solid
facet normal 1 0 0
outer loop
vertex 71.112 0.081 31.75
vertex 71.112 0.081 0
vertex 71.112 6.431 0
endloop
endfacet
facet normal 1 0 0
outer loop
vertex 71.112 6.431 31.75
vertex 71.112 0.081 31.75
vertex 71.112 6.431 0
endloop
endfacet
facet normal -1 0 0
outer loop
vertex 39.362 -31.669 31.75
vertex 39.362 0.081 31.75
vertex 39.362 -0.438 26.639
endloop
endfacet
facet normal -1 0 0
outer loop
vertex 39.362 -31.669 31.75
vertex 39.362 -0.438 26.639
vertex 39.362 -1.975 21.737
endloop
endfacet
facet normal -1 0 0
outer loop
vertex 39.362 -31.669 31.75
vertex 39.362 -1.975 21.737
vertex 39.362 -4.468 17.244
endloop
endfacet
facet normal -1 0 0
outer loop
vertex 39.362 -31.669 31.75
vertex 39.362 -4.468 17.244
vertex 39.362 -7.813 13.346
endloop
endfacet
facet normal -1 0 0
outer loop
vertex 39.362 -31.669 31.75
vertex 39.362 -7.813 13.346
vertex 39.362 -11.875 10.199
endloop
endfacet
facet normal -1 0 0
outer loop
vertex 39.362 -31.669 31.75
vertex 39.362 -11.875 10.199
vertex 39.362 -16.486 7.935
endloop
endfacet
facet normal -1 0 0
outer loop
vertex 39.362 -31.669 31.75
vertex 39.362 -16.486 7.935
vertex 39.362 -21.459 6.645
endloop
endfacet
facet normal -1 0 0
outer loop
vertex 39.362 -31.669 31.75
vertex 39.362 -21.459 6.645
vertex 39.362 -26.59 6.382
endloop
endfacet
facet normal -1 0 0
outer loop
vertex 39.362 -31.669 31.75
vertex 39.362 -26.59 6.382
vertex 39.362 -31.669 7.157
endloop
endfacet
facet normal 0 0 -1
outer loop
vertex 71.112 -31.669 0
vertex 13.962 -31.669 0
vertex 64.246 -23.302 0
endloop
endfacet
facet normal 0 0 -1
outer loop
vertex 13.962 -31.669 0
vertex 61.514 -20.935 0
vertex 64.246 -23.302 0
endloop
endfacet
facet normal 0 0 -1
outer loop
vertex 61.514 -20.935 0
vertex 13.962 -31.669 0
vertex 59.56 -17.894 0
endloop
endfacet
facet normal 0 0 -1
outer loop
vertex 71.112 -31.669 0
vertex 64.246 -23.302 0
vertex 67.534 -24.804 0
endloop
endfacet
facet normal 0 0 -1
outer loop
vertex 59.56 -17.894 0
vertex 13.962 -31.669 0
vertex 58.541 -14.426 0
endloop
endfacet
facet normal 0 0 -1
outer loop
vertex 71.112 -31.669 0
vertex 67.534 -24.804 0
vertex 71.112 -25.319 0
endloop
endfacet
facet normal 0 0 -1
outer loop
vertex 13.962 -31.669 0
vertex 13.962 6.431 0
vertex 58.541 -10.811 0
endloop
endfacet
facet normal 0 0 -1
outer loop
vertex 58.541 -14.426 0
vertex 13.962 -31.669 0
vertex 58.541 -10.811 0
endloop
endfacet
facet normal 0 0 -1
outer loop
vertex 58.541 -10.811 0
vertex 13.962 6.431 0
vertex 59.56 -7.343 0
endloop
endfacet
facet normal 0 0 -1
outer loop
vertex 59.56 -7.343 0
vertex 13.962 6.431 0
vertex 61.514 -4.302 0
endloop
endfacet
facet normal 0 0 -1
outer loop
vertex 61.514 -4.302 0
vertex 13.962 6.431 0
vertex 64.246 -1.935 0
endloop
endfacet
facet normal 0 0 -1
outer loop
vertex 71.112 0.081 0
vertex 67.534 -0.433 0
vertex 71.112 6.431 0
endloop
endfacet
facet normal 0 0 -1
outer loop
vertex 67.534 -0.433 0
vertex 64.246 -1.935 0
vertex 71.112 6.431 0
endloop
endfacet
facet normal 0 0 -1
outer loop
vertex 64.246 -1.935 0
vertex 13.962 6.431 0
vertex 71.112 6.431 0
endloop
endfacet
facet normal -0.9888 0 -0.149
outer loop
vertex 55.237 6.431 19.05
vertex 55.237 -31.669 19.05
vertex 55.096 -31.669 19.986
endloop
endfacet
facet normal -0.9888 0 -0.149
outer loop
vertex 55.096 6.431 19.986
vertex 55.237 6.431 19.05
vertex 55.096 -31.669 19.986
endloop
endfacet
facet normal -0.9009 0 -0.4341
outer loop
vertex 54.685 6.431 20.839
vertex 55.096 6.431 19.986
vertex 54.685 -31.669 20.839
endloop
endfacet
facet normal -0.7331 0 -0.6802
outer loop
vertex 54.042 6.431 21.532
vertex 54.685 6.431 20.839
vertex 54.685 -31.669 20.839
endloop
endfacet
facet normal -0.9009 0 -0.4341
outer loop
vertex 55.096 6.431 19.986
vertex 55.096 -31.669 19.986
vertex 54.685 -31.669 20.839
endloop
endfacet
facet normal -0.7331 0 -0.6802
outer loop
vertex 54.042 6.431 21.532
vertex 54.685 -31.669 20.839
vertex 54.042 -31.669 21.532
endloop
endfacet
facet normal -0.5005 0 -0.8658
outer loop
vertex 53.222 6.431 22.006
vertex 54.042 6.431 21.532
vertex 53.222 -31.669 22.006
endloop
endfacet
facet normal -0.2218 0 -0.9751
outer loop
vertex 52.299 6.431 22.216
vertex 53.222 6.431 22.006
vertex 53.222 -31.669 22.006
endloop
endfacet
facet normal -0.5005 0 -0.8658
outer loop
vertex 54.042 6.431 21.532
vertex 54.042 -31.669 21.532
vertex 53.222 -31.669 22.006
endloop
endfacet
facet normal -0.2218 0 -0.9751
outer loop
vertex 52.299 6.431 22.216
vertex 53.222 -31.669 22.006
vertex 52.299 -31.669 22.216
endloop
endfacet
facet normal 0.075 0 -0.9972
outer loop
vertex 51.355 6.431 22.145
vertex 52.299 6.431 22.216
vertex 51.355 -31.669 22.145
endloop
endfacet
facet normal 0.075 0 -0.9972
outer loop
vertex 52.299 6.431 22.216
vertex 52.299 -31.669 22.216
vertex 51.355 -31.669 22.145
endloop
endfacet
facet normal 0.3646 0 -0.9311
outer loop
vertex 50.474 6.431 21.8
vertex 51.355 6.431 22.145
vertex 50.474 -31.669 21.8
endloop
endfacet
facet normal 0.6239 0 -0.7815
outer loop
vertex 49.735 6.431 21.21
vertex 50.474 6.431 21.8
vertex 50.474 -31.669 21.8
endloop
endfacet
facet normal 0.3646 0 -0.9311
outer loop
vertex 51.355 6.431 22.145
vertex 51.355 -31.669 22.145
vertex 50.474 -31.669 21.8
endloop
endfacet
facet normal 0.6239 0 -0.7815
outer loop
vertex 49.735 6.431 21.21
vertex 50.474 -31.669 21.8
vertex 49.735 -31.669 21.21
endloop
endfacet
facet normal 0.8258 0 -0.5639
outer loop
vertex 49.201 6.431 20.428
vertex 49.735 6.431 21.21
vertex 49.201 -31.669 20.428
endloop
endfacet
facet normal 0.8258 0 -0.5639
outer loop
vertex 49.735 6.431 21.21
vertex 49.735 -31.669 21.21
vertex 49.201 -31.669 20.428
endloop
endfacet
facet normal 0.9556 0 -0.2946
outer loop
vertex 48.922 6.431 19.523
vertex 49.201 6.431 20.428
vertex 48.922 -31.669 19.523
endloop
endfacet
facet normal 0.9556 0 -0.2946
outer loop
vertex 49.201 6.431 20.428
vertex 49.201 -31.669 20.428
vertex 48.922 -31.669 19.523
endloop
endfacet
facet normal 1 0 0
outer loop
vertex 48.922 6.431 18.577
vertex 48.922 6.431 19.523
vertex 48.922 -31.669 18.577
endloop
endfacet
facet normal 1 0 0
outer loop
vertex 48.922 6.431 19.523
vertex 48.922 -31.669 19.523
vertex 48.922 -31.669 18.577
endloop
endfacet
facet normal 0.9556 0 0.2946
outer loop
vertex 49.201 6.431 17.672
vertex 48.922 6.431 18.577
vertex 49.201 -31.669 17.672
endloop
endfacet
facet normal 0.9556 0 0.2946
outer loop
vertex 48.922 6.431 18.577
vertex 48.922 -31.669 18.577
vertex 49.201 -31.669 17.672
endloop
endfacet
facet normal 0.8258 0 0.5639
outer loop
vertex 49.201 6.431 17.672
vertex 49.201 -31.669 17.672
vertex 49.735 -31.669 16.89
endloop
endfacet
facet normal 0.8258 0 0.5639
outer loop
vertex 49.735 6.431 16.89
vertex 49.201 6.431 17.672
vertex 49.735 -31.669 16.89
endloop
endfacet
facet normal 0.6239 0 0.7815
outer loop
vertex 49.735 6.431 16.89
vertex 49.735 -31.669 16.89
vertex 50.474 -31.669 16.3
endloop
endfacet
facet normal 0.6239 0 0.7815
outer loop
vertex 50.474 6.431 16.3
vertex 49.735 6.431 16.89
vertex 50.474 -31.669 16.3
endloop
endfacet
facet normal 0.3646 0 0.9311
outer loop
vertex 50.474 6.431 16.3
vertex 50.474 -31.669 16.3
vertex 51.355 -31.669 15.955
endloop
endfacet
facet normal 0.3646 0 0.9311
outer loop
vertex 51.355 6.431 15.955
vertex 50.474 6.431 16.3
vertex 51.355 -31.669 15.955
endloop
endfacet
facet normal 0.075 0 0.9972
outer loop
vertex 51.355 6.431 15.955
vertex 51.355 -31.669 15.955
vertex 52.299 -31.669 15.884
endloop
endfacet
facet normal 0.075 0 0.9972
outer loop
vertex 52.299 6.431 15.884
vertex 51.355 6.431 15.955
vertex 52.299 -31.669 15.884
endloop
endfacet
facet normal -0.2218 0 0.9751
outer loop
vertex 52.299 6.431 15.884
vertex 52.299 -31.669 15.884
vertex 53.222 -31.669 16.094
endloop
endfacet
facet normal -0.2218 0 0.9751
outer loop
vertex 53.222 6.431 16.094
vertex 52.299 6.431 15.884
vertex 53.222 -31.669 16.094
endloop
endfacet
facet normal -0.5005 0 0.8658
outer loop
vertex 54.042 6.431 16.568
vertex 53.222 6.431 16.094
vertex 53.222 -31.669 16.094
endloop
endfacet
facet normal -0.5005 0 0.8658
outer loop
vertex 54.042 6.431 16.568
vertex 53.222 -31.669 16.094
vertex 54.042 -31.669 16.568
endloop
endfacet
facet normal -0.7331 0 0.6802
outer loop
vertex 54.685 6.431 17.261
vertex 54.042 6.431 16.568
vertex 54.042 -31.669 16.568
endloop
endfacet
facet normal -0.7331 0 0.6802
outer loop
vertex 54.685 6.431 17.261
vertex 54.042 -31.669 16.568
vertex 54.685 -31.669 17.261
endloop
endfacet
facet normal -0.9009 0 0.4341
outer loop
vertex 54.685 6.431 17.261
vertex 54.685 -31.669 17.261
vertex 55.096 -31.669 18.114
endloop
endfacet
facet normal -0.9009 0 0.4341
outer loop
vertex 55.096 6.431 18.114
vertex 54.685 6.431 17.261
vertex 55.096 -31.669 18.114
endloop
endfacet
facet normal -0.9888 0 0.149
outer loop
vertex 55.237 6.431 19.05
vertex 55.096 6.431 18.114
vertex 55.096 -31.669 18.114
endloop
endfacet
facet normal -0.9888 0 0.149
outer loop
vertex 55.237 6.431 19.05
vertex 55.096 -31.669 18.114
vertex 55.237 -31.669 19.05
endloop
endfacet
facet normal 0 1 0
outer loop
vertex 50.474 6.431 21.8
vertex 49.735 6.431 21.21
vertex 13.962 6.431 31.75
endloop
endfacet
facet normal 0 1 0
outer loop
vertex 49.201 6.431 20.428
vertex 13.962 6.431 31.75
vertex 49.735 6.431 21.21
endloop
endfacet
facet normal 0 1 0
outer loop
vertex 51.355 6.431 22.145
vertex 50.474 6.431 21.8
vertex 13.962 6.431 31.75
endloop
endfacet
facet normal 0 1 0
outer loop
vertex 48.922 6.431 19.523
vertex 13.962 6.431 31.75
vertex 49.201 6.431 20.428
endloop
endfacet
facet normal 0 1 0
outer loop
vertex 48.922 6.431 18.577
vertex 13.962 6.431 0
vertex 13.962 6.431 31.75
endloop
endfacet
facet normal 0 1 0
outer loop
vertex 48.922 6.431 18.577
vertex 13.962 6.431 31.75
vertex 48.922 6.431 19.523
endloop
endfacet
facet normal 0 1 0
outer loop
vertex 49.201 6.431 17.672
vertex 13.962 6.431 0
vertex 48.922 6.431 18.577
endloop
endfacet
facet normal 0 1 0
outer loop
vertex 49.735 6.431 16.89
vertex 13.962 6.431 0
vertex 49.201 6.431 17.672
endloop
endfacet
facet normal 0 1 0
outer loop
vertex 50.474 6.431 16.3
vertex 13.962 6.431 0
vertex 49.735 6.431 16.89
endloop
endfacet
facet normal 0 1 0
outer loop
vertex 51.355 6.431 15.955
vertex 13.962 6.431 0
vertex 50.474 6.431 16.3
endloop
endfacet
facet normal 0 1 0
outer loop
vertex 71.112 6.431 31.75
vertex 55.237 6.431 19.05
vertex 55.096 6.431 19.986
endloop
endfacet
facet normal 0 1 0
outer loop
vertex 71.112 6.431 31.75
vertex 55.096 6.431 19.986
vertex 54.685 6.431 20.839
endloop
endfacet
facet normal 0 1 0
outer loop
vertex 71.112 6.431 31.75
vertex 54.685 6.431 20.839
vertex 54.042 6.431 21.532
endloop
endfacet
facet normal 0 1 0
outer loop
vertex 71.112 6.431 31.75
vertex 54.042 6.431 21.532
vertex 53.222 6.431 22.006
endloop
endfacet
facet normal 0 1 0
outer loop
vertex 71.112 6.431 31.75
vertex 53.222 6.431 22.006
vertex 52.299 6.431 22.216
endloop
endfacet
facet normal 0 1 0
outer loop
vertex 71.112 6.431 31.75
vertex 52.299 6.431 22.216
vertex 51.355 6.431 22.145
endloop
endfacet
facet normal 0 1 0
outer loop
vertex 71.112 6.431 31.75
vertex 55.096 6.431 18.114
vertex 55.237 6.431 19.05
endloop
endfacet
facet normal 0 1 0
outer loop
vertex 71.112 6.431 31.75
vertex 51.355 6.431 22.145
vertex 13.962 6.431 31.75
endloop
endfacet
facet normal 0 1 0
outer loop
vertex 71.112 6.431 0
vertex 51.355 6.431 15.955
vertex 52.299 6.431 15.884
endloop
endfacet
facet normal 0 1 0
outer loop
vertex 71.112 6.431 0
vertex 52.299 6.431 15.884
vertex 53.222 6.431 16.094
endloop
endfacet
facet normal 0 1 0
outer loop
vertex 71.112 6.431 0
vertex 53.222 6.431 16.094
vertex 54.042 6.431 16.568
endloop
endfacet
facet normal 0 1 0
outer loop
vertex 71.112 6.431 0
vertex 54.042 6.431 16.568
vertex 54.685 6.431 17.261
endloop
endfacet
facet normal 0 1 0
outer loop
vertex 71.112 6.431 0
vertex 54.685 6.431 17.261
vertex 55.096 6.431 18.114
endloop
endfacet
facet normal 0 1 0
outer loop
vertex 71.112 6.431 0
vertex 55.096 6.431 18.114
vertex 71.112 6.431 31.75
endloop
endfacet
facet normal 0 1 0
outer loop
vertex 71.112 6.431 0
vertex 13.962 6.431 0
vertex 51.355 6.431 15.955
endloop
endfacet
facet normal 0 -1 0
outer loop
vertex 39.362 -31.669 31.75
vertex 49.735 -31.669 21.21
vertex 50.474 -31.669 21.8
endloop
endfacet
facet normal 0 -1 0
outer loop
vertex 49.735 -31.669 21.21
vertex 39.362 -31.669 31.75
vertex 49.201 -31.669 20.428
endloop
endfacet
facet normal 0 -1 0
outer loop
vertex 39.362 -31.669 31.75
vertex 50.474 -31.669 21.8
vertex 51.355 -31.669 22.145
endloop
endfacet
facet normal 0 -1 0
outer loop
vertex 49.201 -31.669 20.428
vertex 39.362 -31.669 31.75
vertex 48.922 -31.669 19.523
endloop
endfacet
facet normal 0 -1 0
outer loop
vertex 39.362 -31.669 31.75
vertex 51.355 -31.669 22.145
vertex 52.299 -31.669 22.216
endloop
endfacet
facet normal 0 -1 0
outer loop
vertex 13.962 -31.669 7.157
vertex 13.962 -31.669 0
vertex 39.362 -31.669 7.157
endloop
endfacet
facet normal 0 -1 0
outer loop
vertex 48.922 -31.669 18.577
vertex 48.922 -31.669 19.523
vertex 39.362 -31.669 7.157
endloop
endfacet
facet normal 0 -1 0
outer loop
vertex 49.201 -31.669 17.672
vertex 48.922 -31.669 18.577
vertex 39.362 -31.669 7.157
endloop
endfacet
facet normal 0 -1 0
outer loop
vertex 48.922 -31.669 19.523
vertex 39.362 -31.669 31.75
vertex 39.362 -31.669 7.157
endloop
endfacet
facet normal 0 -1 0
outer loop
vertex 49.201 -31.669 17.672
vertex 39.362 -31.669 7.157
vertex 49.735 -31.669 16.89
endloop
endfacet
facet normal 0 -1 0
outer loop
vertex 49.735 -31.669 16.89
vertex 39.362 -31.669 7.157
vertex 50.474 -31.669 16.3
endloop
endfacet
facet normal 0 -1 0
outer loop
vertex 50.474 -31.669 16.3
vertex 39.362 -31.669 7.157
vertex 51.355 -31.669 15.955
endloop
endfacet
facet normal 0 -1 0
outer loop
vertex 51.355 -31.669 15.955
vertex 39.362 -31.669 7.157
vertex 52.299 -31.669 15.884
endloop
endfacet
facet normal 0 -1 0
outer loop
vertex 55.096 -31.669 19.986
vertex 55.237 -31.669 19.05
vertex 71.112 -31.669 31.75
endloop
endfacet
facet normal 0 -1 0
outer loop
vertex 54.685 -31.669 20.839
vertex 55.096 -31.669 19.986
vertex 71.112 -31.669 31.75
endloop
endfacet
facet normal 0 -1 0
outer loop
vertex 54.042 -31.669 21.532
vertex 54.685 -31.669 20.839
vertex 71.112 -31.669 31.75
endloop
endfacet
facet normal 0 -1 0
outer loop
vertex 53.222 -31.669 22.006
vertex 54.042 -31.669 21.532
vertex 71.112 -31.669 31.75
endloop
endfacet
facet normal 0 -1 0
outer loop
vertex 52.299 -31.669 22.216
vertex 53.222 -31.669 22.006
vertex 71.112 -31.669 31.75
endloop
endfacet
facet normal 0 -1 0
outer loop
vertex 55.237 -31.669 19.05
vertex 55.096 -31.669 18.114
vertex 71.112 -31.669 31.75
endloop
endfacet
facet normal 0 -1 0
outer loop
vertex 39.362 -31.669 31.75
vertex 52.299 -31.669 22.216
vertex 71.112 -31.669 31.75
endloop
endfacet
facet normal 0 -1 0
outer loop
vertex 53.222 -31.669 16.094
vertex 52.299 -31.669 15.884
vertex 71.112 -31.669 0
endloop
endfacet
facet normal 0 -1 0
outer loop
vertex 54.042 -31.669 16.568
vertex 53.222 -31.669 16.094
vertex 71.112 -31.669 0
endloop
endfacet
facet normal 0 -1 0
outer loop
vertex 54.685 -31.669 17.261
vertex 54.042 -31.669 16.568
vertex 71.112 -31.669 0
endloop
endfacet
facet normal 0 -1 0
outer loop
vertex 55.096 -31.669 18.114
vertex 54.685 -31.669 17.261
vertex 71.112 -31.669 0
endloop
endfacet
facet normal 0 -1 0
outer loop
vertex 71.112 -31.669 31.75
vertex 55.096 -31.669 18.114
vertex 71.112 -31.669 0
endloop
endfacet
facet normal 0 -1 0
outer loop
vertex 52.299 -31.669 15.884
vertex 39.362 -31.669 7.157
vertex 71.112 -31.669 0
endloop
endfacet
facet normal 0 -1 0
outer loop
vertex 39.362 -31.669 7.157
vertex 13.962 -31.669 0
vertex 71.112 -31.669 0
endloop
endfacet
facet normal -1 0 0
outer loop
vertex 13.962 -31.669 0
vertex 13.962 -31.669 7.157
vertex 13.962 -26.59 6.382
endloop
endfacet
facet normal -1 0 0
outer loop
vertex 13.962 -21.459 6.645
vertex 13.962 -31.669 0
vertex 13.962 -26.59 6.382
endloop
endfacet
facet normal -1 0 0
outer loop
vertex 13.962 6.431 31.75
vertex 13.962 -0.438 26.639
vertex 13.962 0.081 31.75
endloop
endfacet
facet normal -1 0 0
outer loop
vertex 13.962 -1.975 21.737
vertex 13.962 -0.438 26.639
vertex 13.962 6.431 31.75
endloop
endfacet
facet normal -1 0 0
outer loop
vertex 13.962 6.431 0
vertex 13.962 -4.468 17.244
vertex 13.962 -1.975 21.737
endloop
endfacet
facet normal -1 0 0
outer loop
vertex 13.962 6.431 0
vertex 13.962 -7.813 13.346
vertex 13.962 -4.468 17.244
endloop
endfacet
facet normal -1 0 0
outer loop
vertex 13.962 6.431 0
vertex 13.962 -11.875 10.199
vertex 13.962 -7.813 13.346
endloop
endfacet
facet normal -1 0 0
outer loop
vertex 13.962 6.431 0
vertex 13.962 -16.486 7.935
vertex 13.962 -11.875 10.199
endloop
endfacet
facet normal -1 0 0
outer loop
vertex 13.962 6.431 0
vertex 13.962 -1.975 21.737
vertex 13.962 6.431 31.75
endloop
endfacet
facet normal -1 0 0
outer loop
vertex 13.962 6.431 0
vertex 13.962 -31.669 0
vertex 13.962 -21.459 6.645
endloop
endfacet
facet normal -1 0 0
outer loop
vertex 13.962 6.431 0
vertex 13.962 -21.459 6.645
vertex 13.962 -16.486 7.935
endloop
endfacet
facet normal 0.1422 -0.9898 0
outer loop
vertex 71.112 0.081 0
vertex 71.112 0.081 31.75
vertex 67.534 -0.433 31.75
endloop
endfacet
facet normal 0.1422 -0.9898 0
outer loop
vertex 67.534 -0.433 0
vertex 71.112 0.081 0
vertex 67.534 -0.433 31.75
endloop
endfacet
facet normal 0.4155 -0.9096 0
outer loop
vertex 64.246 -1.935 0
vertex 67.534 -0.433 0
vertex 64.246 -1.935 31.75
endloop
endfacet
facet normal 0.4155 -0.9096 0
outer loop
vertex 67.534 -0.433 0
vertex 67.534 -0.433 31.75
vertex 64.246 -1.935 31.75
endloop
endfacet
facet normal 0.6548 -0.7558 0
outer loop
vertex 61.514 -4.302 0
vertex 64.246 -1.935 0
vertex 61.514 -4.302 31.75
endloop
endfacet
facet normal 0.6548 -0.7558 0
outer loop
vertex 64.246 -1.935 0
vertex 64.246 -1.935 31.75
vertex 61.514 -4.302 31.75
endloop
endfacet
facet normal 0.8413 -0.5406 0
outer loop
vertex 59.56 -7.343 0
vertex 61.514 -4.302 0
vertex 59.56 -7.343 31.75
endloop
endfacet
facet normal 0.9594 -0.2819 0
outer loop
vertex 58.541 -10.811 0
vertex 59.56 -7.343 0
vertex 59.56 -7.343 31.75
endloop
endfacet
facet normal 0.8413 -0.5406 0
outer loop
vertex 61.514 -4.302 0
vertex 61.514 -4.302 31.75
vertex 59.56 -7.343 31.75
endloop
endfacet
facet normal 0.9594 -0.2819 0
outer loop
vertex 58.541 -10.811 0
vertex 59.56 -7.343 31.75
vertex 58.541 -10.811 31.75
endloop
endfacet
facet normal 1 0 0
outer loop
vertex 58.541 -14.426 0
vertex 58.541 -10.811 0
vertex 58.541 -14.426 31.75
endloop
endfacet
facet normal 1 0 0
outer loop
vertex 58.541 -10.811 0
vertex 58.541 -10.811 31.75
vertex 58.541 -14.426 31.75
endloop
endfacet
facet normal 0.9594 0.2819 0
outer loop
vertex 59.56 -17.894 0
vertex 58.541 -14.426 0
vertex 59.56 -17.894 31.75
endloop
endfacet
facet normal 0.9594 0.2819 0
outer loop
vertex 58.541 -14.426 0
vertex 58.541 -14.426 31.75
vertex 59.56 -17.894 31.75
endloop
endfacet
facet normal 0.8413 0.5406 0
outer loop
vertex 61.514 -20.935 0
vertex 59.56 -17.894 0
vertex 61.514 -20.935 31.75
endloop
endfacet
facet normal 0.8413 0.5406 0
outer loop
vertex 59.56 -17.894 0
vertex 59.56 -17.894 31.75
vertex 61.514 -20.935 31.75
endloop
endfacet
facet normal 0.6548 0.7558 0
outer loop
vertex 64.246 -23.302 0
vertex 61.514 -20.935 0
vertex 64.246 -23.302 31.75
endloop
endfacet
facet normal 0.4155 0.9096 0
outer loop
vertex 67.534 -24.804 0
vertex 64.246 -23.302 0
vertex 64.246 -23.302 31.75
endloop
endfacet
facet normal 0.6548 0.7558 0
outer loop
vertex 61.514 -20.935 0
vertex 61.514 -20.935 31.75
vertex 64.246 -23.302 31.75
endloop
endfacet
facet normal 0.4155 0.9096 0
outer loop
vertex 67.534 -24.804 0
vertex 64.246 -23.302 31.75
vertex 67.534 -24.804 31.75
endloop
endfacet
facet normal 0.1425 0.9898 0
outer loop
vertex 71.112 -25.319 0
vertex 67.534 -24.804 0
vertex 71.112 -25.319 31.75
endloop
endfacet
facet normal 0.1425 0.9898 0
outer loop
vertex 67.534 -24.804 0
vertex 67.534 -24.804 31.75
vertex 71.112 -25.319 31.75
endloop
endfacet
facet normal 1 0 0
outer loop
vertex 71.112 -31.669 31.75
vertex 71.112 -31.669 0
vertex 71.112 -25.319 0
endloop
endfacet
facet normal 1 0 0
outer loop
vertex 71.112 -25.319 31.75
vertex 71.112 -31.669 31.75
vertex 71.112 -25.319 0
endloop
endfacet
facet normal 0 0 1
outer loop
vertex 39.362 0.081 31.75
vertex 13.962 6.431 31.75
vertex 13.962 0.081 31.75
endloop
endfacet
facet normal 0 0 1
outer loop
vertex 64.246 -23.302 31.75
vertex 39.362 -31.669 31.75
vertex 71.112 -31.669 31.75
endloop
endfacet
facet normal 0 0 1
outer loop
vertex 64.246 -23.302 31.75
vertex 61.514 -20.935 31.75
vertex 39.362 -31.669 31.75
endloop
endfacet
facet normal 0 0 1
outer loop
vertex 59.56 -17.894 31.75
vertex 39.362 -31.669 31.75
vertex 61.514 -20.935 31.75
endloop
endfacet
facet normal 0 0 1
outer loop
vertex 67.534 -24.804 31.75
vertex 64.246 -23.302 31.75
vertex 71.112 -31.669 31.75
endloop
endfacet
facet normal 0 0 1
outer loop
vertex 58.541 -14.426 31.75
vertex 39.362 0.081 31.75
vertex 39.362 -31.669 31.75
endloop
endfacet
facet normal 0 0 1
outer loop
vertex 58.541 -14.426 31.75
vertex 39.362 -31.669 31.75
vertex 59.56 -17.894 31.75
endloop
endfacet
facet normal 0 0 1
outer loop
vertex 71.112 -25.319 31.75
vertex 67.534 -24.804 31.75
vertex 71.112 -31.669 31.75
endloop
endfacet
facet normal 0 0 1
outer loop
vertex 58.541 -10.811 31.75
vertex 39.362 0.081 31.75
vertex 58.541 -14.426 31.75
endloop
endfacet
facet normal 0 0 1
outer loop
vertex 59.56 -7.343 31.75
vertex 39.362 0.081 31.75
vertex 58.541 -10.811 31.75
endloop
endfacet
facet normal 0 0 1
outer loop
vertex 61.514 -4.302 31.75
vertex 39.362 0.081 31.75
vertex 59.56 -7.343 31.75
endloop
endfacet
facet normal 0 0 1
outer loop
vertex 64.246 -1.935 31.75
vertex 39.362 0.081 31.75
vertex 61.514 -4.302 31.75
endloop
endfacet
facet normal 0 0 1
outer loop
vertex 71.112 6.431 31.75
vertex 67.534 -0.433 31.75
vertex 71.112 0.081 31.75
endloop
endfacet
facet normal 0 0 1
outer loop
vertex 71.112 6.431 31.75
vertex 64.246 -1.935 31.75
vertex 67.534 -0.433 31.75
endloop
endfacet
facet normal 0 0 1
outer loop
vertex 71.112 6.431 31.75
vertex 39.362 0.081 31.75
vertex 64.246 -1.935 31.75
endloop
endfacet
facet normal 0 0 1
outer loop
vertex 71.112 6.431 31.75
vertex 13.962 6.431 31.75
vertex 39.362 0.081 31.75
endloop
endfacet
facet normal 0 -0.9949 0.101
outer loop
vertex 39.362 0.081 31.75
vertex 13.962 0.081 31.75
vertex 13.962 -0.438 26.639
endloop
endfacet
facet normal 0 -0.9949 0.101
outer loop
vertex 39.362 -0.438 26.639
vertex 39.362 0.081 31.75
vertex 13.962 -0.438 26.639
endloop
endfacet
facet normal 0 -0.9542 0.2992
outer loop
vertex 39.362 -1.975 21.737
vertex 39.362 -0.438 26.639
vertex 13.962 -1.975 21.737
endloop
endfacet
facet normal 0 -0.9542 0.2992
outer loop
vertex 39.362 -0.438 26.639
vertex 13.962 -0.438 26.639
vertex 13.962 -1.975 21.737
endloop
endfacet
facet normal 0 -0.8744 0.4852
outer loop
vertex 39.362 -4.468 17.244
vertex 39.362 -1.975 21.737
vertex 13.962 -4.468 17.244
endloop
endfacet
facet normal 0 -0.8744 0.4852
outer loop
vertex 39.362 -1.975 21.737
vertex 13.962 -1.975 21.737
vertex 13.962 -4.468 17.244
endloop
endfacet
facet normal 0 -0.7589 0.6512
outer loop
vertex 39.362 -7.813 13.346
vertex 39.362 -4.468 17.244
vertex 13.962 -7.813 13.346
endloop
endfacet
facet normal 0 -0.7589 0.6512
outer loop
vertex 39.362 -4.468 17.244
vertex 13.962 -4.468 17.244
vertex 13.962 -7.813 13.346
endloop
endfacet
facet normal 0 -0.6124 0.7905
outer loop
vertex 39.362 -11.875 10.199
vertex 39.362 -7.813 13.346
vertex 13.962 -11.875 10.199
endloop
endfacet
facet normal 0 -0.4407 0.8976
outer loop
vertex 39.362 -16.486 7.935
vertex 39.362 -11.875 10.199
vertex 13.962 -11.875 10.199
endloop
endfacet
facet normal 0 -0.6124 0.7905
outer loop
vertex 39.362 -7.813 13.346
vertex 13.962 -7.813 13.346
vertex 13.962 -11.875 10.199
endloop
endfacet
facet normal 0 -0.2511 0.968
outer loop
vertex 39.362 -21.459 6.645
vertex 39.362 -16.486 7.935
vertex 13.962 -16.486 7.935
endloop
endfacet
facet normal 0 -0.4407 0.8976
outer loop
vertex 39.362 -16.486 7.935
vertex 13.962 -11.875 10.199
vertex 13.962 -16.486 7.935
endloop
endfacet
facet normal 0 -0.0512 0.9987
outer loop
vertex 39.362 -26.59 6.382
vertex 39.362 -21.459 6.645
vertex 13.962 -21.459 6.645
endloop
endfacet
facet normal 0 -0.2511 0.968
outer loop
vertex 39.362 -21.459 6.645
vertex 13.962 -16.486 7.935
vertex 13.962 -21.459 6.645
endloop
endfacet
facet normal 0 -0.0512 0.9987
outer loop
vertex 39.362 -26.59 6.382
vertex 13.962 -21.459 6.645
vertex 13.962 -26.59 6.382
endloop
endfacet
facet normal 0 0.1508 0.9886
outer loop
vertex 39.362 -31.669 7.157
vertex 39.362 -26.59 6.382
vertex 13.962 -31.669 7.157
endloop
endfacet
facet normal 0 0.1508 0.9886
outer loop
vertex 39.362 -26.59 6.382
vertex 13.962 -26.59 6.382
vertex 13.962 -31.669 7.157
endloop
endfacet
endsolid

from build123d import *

# Parameters (mm, degrees)
F0_W     = 57.15
F0_H     = 38.1
F1_DEPTH = 31.75
F3_DEPTH = 31.75
F4_R     = 3.175
F5_DEPTH = 37.846
F6_DEPTH = 38.1
F7_R     = 25.4
F8_DEPTH = 25.4


with BuildPart() as f1:
    # F0 (on Top) → F1 (new body)
    with BuildSketch(Plane.XY):
        with Locations((42.536962, -12.618525)):
            Rectangle(F0_W, F0_H)
    extrude(amount=F1_DEPTH)

    # F2 (on face) → F3 (cut)
    with BuildSketch(Plane.XY.offset(31.75)):
        with BuildLine():
            ThreePointArc((71.111962, -25.318525), (80.092218, -21.598781), (83.811962, -12.618525))
            ThreePointArc((83.811962, -12.618525), (80.092218, -3.638269), (71.111962, 0.081475))
            Line((71.111962, 0.081475), (71.111962, -25.318525))
        make_face()
        with BuildLine():
            Line((71.111962, -25.318525), (71.111962, 0.081475))
            ThreePointArc((71.111962, 0.081475), (58.411962, -12.618525), (71.111962, -25.318525))
        make_face()
    extrude(amount=-F3_DEPTH, mode=Mode.SUBTRACT)

    # F4 (on face) → F5 (cut)
    with BuildSketch(Plane.XZ.offset(31.668525)):
        with Locations((52.061962, 19.05)):
            Circle(F4_R)
    extrude(amount=-F5_DEPTH, mode=Mode.SUBTRACT)

    # F4 (on face) → F6 (cut)
    with BuildSketch(Plane.XZ.offset(31.668525)):
        with Locations((52.061962, 19.05)):
            Circle(F4_R)
    extrude(amount=-F6_DEPTH, mode=Mode.SUBTRACT)

    # F7 (on face) → F8 (cut)
    with BuildSketch(Plane(origin=(13.961962, 0, 0), x_dir=(0, -1, 0), z_dir=(-1, 0, 0))):
        with Locations((25.318525, 31.75)):
            Circle(F7_R)
    extrude(amount=-F8_DEPTH, mode=Mode.SUBTRACT)


solid = f1.part
